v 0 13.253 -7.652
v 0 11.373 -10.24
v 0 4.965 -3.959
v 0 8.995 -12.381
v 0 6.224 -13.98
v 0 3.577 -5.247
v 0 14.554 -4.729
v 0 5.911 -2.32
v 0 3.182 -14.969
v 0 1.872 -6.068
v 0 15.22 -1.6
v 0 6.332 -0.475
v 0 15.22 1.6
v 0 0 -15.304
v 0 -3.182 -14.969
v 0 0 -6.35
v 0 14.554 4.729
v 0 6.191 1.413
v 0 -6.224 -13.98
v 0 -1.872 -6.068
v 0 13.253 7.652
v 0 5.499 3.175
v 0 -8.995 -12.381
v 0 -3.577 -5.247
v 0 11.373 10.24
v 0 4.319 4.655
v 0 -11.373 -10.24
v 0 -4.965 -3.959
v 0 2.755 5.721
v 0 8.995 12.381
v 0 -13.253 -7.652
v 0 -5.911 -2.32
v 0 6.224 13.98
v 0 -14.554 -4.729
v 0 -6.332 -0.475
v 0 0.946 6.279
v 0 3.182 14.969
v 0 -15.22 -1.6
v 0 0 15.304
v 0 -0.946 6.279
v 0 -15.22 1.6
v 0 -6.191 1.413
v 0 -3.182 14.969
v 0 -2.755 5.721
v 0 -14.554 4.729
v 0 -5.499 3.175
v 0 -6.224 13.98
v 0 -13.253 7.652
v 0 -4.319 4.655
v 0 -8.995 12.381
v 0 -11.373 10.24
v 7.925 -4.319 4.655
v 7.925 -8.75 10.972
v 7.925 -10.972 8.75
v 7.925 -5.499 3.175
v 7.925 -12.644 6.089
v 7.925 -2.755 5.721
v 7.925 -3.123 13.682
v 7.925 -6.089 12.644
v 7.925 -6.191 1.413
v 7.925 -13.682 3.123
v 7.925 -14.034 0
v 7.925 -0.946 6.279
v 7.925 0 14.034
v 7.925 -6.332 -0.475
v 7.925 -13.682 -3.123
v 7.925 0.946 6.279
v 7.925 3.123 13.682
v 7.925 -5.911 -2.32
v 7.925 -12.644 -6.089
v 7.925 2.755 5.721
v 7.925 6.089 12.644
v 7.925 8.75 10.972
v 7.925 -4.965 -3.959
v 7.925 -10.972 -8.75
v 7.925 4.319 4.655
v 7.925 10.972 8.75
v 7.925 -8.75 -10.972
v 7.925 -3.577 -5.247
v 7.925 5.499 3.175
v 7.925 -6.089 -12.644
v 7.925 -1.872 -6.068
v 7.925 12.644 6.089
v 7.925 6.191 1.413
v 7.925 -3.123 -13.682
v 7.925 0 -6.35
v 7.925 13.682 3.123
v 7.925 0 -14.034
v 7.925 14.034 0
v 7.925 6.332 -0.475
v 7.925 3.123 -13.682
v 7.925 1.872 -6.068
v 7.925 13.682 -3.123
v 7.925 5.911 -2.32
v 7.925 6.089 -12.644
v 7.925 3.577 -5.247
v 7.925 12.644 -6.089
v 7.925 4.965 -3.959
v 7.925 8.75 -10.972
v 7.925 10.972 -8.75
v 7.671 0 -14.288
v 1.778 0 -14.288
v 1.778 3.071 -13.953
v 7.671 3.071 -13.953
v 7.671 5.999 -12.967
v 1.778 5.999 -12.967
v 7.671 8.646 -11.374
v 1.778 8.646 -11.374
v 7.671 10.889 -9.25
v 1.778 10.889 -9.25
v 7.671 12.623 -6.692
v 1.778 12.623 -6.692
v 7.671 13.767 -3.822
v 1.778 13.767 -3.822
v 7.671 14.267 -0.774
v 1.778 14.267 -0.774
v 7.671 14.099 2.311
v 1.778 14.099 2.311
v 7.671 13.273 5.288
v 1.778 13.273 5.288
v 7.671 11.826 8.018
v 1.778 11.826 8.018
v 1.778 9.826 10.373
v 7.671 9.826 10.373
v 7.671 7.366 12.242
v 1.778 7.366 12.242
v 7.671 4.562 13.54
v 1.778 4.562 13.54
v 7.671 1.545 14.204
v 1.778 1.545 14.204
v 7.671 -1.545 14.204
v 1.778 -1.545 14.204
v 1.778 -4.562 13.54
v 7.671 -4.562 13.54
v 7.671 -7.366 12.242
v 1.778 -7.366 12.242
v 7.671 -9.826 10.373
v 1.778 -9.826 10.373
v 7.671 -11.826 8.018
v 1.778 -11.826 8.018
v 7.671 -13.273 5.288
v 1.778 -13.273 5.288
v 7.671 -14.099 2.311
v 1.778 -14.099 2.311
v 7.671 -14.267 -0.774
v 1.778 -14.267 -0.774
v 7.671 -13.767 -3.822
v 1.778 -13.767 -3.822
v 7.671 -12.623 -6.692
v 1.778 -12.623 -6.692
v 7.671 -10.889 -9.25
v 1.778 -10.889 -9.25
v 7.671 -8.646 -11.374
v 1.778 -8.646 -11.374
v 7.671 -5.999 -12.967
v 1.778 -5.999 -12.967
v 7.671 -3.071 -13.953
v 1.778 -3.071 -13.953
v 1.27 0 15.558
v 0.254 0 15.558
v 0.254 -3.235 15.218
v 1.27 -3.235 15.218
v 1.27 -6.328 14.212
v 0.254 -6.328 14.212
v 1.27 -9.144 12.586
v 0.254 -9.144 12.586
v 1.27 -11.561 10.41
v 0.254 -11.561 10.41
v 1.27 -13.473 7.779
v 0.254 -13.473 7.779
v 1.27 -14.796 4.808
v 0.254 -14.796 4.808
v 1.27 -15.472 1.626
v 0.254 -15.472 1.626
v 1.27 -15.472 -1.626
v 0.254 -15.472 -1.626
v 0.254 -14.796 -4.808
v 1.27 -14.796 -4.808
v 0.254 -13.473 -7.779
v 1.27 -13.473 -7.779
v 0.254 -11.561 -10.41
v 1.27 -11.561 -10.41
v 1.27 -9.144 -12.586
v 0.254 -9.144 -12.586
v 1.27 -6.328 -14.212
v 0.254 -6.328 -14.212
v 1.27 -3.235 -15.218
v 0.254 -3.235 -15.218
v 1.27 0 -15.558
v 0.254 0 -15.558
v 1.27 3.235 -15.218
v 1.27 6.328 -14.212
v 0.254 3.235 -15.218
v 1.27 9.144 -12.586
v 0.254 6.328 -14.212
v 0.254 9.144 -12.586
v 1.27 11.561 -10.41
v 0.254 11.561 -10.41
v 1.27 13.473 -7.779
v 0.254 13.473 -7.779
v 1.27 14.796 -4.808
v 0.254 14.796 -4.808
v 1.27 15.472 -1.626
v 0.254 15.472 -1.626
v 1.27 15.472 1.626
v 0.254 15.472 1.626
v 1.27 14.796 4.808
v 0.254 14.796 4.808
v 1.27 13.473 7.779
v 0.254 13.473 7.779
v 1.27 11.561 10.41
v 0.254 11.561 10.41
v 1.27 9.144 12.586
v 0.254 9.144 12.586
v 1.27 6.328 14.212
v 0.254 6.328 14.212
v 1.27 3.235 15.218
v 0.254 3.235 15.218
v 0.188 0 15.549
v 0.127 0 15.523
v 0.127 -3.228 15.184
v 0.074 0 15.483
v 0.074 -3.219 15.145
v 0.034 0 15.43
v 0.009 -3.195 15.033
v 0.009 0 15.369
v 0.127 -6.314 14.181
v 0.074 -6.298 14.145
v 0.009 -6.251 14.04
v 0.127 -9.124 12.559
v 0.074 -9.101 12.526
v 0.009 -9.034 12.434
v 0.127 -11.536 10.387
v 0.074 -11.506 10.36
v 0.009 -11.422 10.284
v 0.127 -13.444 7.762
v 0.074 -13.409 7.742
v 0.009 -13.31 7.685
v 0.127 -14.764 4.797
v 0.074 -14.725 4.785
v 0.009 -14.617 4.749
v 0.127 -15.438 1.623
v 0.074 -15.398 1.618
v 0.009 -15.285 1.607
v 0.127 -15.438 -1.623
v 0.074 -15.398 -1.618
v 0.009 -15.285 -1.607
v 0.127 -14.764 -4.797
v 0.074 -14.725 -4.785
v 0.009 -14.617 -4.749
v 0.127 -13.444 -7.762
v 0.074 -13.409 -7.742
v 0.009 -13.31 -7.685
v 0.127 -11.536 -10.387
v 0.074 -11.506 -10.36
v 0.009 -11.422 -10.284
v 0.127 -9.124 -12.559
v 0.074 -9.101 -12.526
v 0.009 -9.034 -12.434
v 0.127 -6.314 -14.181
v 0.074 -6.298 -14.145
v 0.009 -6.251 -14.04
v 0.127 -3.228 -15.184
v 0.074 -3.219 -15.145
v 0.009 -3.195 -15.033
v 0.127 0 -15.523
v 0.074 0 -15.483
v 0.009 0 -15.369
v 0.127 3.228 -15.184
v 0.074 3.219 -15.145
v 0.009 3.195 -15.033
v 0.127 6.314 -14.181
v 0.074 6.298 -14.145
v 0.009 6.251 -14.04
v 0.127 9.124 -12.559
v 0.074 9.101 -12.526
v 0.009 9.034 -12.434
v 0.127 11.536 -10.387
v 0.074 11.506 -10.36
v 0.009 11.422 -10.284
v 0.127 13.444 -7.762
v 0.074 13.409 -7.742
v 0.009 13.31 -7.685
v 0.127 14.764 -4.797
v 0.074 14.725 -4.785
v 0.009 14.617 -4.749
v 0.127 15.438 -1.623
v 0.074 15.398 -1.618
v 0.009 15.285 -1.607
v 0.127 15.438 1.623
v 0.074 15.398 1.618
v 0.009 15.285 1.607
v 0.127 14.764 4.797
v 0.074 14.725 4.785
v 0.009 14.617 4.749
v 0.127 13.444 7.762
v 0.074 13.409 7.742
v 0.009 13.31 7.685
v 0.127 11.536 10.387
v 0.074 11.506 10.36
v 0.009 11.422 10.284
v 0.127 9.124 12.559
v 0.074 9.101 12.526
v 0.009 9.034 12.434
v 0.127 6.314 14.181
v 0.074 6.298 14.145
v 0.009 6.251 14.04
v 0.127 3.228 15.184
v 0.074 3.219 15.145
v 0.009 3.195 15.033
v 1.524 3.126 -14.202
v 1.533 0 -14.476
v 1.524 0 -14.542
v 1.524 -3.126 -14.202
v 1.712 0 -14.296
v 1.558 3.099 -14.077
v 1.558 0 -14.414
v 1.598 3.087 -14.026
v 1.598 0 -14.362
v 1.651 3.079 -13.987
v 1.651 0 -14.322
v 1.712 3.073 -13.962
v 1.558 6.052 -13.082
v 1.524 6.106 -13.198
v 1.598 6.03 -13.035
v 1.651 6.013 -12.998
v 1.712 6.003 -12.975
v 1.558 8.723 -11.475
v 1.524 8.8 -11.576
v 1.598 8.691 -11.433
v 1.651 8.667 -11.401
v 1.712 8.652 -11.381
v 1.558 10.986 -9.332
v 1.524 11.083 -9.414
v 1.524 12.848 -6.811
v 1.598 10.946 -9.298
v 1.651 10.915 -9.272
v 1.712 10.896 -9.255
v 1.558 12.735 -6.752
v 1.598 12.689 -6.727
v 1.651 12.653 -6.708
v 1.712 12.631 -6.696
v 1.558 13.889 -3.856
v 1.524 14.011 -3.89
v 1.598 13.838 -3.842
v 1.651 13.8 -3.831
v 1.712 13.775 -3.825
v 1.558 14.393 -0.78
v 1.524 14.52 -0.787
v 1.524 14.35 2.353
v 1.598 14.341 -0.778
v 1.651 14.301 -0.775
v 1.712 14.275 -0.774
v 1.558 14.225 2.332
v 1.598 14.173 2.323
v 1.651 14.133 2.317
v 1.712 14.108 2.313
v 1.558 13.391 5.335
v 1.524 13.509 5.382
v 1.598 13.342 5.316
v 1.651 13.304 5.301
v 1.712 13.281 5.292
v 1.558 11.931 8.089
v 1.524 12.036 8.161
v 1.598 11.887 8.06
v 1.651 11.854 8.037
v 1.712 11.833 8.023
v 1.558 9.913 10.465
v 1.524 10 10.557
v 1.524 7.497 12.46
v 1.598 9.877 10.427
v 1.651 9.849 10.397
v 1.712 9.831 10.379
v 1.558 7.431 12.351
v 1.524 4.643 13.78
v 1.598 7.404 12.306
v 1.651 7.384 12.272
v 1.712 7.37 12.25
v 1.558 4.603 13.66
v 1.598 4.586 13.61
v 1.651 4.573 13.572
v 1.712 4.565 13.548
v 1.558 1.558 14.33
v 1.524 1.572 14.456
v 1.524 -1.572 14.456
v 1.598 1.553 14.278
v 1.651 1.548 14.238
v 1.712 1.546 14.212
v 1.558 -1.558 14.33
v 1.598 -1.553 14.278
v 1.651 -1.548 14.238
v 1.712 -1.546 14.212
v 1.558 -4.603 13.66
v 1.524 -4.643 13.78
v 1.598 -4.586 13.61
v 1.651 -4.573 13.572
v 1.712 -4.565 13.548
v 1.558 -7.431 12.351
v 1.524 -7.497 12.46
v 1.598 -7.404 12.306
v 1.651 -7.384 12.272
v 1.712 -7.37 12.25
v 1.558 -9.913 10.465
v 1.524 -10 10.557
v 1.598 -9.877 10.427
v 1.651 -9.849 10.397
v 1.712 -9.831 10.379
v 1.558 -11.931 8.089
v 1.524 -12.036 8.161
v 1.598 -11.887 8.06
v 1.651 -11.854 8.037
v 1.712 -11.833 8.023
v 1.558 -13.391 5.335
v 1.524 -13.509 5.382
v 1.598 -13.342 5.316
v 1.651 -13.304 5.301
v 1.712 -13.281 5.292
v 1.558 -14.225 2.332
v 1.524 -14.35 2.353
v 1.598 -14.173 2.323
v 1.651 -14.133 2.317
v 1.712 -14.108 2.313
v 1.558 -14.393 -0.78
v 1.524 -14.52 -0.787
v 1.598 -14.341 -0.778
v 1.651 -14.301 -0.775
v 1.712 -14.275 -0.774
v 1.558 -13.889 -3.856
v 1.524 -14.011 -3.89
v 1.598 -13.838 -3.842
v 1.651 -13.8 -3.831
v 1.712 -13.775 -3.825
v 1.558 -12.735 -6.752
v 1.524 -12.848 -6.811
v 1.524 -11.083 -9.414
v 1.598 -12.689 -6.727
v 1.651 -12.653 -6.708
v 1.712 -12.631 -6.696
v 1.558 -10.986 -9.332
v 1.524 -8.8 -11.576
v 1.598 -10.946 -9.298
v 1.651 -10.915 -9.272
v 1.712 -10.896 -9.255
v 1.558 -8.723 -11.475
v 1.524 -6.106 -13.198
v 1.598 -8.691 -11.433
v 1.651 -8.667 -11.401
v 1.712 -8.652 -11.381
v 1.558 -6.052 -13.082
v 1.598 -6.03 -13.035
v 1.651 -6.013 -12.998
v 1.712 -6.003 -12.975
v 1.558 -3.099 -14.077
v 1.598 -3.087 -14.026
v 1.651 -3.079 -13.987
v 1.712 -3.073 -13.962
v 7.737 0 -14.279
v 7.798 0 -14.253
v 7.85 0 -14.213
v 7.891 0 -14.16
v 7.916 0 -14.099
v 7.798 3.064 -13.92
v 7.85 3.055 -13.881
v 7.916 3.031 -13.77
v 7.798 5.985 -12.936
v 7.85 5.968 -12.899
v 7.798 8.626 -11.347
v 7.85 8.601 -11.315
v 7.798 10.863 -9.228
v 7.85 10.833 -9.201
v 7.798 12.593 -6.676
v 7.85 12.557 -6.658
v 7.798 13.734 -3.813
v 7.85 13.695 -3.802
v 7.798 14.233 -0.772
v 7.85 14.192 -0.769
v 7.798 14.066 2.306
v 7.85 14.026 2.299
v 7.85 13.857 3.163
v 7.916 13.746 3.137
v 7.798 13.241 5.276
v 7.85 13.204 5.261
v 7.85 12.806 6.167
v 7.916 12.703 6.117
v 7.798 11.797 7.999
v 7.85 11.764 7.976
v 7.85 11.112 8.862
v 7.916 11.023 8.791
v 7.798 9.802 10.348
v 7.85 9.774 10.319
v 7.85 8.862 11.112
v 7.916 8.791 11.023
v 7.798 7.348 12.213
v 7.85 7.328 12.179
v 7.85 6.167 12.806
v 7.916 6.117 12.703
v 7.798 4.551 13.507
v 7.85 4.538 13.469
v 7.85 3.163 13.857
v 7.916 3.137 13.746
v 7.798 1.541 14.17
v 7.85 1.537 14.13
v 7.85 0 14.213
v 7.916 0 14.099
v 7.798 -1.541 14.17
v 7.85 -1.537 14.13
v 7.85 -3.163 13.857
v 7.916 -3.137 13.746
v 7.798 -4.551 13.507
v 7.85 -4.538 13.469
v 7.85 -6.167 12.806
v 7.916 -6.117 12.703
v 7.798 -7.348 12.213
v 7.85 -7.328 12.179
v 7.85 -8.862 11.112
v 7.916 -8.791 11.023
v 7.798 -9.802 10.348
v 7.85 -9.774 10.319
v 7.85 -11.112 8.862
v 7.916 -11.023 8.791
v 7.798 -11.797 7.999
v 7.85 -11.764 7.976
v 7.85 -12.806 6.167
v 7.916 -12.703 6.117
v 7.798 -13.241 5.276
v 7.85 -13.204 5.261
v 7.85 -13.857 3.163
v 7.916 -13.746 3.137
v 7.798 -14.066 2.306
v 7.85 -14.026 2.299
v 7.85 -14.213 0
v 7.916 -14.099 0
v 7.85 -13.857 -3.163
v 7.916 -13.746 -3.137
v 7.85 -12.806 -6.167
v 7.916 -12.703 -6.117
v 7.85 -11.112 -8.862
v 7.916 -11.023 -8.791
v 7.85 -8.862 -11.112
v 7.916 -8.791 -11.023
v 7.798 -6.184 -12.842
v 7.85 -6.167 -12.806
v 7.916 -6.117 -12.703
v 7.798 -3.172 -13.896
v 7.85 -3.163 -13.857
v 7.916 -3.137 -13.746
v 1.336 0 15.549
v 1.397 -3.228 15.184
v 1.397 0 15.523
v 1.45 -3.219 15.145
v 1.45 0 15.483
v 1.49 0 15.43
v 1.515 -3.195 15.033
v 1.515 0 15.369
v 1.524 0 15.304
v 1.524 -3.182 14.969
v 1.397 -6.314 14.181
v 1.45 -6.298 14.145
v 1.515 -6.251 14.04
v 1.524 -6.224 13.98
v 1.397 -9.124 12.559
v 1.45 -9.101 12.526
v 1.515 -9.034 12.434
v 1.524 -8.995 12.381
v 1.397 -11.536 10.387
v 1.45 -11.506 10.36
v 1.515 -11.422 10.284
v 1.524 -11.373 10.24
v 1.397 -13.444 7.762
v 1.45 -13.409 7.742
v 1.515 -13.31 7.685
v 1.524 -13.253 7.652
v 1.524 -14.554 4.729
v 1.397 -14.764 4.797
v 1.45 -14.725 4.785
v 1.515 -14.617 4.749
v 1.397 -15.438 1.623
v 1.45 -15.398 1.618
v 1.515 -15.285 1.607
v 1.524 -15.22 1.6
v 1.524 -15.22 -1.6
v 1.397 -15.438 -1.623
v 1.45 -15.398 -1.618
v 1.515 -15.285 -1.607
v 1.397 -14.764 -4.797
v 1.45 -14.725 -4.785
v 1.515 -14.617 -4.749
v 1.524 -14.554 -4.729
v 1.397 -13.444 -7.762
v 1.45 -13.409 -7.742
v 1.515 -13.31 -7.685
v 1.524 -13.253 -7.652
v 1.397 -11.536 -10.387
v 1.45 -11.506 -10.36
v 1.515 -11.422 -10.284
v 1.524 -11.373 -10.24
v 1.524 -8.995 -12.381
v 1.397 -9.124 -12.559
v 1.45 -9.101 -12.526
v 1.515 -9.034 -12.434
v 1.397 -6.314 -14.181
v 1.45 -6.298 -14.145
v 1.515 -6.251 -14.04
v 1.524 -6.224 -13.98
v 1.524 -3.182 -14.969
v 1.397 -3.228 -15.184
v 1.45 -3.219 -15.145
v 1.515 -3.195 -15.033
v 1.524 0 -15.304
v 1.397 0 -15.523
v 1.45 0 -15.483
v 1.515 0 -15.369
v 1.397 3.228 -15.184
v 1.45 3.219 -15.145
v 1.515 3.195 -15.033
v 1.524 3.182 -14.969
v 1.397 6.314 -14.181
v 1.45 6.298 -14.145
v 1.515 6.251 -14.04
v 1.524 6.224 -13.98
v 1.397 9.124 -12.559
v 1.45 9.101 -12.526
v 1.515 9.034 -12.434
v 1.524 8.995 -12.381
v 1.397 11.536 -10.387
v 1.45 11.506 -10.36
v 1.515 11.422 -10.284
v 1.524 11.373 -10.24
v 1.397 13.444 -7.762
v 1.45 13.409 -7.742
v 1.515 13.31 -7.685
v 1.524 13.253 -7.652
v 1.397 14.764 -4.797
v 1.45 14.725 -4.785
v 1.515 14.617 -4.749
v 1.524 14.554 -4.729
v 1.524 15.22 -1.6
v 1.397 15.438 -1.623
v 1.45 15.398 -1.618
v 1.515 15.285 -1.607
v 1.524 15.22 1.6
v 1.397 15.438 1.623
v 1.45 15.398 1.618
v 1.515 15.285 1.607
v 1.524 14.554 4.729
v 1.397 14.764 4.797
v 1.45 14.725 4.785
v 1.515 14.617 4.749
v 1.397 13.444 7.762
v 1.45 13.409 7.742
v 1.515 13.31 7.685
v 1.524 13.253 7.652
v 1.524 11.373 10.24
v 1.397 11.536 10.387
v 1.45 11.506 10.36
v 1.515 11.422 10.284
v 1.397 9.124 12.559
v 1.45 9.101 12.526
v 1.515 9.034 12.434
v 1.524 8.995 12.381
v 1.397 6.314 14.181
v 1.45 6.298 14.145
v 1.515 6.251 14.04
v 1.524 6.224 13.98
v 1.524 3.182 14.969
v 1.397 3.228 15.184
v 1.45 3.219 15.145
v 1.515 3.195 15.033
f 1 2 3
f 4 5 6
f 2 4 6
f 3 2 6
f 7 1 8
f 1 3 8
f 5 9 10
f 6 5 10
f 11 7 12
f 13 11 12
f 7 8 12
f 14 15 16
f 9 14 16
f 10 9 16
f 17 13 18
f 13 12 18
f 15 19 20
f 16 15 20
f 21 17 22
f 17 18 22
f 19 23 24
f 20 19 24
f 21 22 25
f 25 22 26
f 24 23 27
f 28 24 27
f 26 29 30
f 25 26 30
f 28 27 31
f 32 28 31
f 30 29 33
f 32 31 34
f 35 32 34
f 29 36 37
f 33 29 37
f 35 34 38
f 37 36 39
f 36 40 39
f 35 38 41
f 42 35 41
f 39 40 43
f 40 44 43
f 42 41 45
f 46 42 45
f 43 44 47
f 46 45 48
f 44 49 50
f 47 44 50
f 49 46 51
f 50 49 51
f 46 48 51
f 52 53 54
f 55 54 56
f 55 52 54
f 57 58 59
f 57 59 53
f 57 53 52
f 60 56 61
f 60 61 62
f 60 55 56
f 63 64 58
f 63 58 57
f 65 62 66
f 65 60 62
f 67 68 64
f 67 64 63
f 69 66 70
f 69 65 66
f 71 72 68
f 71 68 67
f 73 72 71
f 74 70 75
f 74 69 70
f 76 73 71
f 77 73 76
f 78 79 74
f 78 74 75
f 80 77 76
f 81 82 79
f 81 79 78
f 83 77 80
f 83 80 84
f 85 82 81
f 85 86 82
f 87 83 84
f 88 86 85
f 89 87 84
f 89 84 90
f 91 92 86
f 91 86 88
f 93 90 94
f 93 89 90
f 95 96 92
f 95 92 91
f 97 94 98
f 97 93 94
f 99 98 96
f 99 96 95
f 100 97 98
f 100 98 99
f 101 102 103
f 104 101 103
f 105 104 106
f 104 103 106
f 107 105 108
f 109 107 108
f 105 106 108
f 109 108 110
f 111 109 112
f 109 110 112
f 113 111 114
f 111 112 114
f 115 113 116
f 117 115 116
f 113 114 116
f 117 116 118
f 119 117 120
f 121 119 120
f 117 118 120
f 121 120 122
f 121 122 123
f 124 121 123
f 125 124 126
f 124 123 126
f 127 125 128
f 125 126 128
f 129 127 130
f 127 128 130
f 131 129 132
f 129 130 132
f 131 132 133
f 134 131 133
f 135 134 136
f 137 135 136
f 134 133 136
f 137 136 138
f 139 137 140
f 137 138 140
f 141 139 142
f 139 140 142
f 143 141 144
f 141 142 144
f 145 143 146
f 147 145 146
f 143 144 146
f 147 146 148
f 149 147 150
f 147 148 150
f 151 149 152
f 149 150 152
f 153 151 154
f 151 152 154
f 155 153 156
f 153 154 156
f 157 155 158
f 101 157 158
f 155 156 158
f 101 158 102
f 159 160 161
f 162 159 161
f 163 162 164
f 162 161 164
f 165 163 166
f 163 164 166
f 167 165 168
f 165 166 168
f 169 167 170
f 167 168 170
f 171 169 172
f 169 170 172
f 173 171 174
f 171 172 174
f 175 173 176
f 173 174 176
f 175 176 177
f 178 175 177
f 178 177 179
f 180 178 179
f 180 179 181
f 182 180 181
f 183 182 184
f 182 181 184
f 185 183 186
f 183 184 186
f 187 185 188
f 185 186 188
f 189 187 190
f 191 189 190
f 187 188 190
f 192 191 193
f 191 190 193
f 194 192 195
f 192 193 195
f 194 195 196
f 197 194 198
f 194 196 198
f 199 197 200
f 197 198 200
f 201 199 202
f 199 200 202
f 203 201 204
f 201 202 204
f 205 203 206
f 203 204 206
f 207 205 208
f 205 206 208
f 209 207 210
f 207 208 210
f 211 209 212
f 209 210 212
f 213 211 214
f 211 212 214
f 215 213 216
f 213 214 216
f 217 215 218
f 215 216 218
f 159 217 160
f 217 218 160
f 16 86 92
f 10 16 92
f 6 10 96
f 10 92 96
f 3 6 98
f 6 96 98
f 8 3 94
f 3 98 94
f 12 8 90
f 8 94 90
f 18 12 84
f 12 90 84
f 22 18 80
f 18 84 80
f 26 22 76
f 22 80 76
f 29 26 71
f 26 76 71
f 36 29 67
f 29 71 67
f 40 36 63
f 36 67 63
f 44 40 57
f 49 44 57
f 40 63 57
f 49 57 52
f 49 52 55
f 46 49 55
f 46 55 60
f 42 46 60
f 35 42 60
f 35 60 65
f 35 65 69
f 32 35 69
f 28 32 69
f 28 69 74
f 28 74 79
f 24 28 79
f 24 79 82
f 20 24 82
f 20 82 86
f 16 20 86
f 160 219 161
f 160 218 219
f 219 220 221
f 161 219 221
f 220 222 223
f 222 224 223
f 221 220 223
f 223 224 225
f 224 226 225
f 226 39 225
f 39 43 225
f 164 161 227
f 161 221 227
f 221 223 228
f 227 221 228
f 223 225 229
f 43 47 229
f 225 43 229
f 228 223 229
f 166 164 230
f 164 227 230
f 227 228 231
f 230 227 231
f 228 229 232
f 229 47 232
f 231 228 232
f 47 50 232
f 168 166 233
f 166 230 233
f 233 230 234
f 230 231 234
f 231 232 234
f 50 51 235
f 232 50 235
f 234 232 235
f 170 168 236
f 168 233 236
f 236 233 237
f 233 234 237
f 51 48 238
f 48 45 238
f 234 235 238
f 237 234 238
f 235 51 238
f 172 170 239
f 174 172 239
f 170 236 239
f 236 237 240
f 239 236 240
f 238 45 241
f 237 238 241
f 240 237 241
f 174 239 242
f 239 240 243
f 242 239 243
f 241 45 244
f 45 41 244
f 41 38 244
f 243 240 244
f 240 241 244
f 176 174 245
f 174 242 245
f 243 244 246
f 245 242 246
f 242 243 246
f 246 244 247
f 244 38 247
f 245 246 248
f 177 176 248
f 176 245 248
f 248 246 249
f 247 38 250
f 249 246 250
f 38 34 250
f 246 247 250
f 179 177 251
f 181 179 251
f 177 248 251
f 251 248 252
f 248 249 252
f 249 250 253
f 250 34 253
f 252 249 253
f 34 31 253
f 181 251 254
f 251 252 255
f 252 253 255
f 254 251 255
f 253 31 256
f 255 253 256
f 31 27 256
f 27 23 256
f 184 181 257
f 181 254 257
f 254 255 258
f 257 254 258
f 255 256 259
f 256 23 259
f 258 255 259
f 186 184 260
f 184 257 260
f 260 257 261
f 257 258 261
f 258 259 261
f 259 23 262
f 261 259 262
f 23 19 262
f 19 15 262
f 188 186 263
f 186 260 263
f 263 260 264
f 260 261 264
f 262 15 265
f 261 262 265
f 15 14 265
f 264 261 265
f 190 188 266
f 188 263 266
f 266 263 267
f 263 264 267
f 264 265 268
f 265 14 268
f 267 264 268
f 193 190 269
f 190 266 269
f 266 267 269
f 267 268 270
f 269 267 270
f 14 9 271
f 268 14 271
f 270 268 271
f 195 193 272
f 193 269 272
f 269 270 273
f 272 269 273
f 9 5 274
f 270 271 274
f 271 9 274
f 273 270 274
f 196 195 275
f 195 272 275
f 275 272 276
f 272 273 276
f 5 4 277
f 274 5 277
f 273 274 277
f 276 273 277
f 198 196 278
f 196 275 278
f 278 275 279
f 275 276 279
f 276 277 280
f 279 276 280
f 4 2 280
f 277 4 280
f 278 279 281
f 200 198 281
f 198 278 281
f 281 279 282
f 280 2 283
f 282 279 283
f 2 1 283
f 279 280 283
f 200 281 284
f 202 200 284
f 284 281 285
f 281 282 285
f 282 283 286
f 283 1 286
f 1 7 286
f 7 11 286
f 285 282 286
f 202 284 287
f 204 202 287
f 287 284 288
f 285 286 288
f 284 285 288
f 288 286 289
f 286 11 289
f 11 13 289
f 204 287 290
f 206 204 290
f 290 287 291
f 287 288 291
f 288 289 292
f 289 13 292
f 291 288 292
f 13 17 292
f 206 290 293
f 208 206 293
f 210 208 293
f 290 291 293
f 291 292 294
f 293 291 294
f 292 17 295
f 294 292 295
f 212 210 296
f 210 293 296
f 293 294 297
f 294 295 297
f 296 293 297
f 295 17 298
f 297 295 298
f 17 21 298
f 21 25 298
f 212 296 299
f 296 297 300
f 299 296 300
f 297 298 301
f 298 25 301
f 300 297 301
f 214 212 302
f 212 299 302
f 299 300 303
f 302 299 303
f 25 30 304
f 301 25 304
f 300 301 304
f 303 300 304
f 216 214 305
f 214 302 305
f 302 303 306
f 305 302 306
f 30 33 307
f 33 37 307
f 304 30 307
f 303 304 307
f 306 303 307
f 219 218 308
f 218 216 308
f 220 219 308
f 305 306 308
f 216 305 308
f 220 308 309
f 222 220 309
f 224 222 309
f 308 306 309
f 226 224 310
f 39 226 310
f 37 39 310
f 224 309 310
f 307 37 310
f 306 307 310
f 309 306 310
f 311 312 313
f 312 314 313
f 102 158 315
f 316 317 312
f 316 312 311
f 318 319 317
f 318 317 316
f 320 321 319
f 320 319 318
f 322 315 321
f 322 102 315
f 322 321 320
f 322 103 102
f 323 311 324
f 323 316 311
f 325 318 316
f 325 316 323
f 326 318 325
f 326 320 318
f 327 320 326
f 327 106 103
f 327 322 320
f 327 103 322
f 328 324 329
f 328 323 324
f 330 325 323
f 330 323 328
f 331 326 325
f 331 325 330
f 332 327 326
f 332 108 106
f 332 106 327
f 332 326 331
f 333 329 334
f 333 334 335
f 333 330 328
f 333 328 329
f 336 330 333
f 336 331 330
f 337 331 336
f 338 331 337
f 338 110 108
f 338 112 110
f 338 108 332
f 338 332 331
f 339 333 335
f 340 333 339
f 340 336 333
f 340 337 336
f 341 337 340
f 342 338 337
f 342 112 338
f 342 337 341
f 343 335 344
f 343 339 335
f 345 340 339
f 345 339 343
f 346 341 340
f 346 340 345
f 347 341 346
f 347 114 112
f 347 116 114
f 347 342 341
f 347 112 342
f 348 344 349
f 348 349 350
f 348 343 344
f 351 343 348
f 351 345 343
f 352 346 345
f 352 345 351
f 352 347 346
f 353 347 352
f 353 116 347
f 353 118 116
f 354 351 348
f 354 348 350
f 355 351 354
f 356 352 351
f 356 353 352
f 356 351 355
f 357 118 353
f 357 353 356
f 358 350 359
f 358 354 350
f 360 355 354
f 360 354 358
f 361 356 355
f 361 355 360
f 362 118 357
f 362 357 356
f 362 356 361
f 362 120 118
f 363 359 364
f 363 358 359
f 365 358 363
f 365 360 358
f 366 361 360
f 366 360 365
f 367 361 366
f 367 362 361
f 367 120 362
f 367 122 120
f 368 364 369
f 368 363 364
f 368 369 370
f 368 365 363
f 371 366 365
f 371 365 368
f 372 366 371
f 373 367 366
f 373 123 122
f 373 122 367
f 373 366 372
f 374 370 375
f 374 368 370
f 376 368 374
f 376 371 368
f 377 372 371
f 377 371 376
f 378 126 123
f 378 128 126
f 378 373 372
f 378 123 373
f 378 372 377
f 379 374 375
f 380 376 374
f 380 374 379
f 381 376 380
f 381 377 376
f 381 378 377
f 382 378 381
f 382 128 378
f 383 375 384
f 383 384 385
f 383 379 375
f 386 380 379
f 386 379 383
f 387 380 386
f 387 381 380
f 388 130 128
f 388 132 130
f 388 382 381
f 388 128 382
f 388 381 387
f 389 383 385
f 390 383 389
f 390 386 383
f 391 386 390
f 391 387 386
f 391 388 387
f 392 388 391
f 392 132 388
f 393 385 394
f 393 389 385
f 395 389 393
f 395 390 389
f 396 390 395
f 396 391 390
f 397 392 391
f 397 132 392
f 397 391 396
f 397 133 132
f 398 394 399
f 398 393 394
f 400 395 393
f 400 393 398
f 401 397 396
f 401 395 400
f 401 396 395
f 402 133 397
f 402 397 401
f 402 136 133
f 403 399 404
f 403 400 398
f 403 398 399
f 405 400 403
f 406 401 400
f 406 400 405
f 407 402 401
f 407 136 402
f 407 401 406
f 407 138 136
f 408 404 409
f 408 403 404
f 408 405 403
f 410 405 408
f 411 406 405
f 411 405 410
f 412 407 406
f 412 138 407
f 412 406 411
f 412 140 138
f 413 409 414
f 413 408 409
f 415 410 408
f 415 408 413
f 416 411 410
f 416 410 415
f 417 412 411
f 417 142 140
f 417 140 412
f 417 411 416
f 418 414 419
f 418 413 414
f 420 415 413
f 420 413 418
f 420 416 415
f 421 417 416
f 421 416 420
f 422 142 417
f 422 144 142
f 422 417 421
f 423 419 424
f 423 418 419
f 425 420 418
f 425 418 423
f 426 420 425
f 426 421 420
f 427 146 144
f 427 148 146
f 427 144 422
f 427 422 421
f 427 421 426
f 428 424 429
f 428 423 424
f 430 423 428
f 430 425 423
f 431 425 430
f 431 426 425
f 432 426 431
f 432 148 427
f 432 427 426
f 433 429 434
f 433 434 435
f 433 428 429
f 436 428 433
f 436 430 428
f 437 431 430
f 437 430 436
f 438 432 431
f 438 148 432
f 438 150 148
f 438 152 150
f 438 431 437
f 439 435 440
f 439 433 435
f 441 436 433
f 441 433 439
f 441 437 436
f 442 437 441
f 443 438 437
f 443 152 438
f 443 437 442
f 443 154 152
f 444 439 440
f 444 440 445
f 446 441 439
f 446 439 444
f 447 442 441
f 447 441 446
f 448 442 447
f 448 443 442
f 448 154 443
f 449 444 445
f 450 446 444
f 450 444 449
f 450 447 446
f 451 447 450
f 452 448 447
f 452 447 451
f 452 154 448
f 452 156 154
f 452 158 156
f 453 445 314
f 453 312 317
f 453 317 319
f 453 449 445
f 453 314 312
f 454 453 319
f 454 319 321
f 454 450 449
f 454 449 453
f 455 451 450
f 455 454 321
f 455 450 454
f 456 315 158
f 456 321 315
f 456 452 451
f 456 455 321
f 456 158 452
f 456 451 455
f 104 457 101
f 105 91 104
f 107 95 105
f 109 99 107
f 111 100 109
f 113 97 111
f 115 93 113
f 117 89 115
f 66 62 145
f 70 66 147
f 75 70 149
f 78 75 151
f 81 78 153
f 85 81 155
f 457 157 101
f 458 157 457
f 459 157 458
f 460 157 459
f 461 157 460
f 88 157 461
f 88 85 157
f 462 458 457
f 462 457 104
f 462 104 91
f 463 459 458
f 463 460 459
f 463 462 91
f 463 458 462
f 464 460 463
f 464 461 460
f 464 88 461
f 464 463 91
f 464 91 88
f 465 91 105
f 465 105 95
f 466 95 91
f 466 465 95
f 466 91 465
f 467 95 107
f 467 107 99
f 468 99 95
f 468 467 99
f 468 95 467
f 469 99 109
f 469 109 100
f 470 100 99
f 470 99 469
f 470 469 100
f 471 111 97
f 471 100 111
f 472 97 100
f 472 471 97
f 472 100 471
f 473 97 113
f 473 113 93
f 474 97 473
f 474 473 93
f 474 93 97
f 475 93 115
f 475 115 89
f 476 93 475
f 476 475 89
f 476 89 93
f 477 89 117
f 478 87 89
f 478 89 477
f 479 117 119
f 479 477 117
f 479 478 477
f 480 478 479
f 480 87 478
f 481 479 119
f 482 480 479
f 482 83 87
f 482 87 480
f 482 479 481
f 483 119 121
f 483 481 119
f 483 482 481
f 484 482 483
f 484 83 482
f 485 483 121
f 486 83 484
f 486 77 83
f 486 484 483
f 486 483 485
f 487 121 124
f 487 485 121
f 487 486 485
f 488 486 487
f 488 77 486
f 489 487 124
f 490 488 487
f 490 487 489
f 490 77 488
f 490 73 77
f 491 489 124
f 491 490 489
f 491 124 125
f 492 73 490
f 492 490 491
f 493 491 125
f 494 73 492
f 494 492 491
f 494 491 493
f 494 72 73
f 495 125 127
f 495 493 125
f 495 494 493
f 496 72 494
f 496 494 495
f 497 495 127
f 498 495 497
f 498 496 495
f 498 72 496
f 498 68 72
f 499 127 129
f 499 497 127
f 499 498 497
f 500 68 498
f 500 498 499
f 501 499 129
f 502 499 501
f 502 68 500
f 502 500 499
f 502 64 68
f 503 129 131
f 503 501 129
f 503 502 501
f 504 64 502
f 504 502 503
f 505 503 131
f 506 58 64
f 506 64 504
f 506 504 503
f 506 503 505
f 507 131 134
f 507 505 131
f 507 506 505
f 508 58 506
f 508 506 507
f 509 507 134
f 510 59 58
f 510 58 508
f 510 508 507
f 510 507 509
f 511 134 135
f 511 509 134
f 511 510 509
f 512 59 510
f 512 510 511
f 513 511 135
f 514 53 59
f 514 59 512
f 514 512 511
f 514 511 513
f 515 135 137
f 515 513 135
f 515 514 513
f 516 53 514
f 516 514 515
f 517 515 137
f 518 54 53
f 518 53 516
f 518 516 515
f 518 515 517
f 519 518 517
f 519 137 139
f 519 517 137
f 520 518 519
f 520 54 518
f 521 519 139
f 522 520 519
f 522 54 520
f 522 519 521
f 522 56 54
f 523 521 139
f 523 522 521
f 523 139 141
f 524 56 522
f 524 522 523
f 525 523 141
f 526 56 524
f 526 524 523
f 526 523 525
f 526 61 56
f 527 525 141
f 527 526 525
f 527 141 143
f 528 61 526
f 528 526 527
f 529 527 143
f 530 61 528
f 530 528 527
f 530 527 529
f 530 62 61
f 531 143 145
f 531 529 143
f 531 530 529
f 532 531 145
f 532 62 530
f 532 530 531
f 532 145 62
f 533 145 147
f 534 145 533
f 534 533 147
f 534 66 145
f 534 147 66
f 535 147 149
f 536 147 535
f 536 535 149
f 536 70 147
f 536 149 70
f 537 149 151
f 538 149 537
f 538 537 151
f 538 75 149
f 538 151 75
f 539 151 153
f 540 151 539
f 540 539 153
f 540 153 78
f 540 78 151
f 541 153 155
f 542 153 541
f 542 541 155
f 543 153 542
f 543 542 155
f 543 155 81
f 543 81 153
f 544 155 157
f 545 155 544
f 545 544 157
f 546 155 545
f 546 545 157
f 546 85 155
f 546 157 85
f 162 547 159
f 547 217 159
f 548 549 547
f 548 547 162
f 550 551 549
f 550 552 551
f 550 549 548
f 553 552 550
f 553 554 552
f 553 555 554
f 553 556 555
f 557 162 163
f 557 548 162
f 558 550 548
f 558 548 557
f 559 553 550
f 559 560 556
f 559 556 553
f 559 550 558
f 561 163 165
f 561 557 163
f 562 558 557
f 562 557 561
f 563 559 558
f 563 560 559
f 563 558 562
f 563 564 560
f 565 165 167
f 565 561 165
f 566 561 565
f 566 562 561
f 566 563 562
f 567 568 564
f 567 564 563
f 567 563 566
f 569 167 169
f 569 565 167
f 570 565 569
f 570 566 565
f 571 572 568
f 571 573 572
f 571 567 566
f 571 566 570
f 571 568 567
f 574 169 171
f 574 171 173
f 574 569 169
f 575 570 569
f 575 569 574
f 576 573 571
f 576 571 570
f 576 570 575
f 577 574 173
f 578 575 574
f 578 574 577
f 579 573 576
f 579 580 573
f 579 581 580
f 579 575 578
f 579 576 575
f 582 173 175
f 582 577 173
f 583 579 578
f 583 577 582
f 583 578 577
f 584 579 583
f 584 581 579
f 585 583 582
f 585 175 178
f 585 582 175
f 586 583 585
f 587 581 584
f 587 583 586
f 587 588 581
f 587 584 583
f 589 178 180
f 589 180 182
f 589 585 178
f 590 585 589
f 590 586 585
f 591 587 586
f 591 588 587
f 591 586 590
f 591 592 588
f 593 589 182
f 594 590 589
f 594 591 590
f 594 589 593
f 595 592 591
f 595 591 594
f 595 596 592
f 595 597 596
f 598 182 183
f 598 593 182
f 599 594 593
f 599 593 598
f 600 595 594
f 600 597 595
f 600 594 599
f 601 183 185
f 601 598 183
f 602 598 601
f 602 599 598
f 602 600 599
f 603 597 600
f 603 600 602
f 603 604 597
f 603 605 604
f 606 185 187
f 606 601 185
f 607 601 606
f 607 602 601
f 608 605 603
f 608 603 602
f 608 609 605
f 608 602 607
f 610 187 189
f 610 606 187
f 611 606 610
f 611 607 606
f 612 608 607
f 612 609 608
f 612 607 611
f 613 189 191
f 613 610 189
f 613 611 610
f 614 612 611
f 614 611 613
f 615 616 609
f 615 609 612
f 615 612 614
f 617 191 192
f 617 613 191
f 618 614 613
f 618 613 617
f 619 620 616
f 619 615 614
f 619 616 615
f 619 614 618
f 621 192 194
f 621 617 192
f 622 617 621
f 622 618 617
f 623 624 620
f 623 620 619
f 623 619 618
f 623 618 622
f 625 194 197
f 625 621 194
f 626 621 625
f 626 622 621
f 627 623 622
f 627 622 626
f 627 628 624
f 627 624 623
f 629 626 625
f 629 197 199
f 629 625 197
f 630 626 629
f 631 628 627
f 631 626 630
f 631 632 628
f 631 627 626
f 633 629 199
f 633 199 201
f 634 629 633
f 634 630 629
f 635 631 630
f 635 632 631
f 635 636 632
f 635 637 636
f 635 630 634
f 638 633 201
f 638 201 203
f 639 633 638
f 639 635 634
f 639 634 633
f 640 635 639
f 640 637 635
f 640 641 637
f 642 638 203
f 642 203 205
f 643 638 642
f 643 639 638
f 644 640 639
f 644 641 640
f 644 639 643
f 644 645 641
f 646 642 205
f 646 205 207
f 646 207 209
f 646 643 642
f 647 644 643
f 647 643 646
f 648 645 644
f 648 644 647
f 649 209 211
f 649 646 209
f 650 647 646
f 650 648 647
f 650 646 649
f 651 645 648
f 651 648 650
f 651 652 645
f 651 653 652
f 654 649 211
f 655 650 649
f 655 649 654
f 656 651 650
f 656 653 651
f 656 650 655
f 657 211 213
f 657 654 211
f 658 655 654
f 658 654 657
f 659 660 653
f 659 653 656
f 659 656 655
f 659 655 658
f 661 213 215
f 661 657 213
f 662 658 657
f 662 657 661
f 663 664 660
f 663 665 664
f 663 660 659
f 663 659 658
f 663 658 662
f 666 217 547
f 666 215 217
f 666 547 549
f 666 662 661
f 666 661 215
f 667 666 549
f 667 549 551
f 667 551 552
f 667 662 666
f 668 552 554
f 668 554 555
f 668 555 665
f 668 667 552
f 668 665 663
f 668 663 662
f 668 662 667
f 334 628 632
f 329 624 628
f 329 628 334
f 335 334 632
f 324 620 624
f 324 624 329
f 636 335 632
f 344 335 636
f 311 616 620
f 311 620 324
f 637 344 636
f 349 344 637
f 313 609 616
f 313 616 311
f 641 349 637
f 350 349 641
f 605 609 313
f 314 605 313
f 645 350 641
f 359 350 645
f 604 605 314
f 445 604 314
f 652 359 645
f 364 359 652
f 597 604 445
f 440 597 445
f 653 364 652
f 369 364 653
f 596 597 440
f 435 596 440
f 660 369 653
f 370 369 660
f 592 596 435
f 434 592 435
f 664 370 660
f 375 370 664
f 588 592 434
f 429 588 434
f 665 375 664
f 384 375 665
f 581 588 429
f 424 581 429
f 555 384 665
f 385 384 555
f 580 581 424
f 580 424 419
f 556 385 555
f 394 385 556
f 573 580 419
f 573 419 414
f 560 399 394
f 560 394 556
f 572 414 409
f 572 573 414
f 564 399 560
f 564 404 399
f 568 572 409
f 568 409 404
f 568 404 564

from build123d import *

# Parameters (mm, degrees)
SKETCH1_R           = 15.5575
BOSS_EXTRUDE1_DEPTH = 1.524
SKETCH2_R           = 14.2875
BOSS_EXTRUDE2_DEPTH = 6.4008
SKETCH3_R           = 6.35
CUT_EXTRUDE1_DEPTH  = 24.38533873
FILLET1_R           = 0.254


with BuildPart() as part:
    # Sketch1 → Boss-Extrude1 (new body)
    with BuildSketch(Plane(origin=(0, 0, 0), x_dir=(0, 0, -1), z_dir=(1, 0, 0))):
        with Locations(Location((0, 0, 0), (0, 0, 180))):
            Circle(SKETCH1_R)
    extrude(amount=BOSS_EXTRUDE1_DEPTH)

    # Sketch2 → Boss-Extrude2 (add)
    with BuildSketch(Plane(origin=(1.524, 0, 0), x_dir=(0, 0, -1), z_dir=(1, 0, 0))):
        Circle(SKETCH2_R)
    extrude(amount=BOSS_EXTRUDE2_DEPTH)

    # Sketch3 → Cut-Extrude1 (cut, through all)
    with BuildSketch(Plane(origin=(7.9248, 0, 0), x_dir=(0, 0, -1), z_dir=(1, 0, 0))):
        Circle(SKETCH3_R)
    extrude(amount=-CUT_EXTRUDE1_DEPTH, mode=Mode.SUBTRACT)

    # Fillet1
    fillet1_edges = [part.edges().sort_by_distance(p)[0] for p in [
        (0, 0, -15.5575),
        (1.524, 0, -15.5575),
        (1.524, 0, 14.2875),
        (7.9248, 0, 14.2875),
    ]]
    fillet(fillet1_edges, radius=FILLET1_R)


solid = part.part
